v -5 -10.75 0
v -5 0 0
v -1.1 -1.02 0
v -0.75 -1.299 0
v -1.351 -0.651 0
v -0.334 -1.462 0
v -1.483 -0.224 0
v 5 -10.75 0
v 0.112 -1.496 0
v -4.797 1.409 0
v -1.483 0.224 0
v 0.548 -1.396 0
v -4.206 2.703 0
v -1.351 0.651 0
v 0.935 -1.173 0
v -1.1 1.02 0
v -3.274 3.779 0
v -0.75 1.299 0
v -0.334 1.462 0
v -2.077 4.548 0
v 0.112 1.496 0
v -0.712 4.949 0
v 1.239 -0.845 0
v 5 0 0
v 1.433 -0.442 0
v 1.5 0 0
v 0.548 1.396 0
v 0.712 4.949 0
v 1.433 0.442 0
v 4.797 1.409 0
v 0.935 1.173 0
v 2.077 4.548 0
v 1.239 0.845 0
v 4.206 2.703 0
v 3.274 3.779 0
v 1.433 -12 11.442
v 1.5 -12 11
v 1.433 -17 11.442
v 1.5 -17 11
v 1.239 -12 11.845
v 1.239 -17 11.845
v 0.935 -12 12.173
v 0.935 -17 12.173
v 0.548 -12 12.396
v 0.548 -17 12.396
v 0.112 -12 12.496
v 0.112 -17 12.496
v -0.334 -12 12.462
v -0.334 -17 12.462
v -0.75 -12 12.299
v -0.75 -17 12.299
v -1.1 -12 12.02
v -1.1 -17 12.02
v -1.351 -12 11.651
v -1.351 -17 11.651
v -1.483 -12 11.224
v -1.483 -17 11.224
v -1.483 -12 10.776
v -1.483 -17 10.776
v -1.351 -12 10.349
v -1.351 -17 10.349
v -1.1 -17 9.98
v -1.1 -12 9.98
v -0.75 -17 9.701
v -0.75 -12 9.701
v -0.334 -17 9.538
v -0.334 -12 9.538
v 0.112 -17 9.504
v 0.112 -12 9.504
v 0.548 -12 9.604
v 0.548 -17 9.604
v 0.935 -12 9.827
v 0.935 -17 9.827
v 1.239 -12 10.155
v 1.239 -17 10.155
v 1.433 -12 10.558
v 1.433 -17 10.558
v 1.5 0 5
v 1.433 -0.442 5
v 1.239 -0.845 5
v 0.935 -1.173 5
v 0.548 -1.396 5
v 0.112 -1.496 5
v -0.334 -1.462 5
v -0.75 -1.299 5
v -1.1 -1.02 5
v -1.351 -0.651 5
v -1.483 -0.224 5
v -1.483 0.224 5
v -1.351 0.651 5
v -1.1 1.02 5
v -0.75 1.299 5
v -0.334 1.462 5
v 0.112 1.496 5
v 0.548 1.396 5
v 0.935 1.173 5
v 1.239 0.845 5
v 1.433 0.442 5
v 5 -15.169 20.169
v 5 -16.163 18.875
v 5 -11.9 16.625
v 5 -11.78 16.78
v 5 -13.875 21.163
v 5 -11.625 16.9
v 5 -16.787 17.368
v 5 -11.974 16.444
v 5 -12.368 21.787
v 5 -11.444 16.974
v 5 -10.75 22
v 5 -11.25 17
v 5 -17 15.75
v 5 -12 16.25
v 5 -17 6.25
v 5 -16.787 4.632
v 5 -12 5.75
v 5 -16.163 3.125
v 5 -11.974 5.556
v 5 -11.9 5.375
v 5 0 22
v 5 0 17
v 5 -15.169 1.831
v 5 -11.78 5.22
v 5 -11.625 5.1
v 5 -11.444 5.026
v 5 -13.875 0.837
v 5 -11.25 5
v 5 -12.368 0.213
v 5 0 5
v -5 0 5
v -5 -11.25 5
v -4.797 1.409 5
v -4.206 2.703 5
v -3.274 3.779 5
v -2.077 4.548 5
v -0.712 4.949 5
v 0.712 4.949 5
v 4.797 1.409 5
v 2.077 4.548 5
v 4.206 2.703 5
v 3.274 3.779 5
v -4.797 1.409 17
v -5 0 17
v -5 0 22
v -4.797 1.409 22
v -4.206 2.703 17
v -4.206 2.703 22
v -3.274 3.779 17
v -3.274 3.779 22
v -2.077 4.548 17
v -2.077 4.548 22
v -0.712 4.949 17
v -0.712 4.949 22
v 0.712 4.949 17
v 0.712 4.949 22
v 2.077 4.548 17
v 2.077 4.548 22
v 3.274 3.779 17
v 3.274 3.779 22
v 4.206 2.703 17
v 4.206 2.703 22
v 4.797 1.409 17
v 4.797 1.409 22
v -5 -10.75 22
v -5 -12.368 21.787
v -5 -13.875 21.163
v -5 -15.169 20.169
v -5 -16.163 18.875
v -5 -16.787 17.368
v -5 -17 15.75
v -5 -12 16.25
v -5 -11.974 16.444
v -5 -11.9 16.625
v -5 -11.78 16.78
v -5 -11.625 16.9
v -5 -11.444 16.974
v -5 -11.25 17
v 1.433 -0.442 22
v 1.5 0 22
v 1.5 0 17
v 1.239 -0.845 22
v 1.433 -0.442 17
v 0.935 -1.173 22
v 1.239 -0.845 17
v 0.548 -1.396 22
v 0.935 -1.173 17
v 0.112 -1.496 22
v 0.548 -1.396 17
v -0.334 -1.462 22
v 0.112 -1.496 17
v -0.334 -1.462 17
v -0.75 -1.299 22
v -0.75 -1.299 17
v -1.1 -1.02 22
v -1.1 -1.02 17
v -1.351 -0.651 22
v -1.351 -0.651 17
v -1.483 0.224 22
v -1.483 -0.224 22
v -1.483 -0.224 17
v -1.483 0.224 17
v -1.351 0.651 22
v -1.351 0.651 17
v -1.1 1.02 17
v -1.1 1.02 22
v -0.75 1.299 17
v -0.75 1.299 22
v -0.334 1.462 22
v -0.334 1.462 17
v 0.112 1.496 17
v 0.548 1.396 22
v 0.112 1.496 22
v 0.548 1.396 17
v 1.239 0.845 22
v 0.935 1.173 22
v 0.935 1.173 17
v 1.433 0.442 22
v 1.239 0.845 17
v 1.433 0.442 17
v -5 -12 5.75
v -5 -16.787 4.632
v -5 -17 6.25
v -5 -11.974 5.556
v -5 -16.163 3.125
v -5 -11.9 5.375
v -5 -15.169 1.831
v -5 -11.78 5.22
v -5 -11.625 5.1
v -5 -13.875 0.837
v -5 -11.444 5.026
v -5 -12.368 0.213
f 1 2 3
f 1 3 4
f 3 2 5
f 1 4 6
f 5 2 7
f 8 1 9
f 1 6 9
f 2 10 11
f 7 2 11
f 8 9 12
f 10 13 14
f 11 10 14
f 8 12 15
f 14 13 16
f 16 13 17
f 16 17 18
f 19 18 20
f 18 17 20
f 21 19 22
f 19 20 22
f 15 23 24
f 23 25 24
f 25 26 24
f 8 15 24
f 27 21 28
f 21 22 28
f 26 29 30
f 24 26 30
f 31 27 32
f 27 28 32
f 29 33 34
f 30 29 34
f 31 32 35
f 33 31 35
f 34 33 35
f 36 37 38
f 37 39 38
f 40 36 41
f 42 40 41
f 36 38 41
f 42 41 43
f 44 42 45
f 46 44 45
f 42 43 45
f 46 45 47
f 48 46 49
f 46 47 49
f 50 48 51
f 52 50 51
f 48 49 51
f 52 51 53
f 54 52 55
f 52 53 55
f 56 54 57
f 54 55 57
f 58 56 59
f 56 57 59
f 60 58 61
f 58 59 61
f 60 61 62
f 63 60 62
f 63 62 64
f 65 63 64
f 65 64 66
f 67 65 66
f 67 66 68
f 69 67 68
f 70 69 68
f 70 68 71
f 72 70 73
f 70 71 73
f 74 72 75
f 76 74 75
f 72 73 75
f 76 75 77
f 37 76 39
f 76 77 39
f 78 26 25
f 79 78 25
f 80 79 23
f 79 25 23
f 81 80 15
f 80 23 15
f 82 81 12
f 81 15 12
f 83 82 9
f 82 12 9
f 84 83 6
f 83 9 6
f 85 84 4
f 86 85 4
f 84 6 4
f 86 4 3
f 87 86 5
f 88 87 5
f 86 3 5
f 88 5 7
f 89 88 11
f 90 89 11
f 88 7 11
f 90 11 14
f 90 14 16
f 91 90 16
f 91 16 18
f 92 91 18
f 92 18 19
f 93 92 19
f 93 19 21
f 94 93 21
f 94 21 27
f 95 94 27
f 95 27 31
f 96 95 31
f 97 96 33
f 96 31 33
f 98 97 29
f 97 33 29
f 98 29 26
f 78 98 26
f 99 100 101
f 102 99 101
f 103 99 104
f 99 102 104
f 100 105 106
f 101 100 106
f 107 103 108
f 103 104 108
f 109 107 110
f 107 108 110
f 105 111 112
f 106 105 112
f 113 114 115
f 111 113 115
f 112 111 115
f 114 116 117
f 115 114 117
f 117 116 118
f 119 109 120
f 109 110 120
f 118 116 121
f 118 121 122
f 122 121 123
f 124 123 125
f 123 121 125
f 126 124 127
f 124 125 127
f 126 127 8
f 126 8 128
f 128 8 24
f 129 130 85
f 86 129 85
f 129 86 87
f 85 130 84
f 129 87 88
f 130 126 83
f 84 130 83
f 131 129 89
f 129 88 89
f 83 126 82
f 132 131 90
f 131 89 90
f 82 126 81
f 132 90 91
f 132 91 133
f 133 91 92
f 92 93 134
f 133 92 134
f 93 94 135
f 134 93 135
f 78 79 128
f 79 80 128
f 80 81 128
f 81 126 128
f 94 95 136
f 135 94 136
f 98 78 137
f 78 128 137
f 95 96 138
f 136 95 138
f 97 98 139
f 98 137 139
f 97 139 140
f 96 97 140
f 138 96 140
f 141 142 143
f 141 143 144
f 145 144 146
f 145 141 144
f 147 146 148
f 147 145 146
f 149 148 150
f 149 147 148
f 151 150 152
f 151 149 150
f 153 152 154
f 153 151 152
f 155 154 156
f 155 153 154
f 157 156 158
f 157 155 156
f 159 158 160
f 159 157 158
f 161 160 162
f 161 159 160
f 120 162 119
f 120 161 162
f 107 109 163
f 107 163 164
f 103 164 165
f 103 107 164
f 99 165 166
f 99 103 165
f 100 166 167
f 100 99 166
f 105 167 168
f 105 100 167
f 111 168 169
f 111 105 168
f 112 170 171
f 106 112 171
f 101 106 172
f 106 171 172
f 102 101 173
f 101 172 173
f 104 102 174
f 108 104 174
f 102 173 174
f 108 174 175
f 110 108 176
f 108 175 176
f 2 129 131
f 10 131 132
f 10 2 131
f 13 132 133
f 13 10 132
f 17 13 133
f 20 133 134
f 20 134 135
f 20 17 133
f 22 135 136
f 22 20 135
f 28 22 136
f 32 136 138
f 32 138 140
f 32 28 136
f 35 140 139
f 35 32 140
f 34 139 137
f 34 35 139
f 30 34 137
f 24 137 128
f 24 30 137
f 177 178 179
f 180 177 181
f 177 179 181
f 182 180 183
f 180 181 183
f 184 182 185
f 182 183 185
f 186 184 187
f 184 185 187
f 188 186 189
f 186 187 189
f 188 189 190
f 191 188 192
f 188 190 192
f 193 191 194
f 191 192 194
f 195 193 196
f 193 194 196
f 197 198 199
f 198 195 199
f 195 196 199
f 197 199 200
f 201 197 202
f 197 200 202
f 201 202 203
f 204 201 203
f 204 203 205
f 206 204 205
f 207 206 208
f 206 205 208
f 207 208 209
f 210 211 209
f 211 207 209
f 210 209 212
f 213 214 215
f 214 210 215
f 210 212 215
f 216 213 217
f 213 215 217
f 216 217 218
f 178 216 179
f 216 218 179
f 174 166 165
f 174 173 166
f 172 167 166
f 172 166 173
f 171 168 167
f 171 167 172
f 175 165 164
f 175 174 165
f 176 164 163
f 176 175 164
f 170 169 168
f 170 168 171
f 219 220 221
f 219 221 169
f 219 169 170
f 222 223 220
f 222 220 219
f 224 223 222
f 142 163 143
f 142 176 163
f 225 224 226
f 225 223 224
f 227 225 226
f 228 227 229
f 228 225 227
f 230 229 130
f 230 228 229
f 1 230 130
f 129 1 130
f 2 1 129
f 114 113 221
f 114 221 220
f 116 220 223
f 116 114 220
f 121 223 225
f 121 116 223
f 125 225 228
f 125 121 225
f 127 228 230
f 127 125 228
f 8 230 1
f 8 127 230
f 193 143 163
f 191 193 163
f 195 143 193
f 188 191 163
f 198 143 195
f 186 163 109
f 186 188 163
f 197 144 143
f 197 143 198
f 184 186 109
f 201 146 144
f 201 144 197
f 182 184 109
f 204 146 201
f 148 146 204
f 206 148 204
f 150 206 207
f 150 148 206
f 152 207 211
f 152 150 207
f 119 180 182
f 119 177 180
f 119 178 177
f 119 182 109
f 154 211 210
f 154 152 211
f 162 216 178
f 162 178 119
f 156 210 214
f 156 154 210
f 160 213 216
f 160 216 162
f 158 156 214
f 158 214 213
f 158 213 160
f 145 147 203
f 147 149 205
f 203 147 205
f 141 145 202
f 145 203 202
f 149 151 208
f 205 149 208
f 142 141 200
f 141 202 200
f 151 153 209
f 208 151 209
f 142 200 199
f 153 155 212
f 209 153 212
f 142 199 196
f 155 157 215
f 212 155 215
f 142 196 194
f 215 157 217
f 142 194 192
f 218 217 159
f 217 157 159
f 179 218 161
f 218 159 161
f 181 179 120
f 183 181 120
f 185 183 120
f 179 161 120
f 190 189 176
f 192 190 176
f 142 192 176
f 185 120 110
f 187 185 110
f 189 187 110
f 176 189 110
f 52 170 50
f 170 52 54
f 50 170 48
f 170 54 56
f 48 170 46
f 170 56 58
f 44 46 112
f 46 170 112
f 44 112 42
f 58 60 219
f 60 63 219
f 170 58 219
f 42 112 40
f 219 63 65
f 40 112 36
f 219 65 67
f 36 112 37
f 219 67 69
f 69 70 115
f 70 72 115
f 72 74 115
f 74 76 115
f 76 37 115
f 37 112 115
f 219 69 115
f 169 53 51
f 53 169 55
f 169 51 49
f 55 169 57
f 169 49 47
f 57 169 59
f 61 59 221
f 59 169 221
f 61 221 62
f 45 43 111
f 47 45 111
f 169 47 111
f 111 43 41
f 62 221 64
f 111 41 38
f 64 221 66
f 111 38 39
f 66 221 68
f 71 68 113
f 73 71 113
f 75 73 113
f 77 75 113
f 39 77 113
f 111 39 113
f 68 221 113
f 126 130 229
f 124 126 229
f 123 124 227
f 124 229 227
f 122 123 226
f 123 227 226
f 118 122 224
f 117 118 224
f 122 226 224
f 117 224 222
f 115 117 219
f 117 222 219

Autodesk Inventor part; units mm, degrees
ref_plane "YZ Plane" through (0, 0, 0) normal (1, 0, 0) x (0, 1, 0)
ref_plane "XZ Plane" through (0, 0, 0) normal (0, 1, 0) x (-1, 0, 0)
ref_plane "XY Plane" through (0, 0, 0) normal (0, 0, 1) x (1, 0, 0)
sketch "Sketch1" plane through (0, 0, 0) normal (0, 0, 1) x (1, 0, 0)
  arc A0 (5, 0) -> (-5, 0) centre (0, 0) ccw
  line L0 (-5, -17) -> (5, -17)
  line L1 (5, -17) -> (5, 0)
  line L2 (-5, -17) -> (-5, 0)
  circle A1 centre (0, 0) radius 1.5
  dimension "d0" = 3
  dimension "d1" = 5
  dimension "d2" = 17
extrude "Extrusion1" add sketch "Sketch1" along normal blind 22
sketch "Sketch2" plane through (5, -17, 0) normal (1, 0, 0) x (0, 0, -1)
  line L0 (0, 17) -> (0, 17) projected
  line L1 (0, 17) -> (-22, 17) projected
  line L2 (-22, 17) -> (-22, 17) projected
  line L3 (0, 17) -> (-22, 17) projected
  line L4 (0, 0) -> (0, 17) projected
  line L5 (0, 17) -> (-22, 17) projected
  line L6 (-22, 0) -> (-22, 17) projected
  line L7 (0, 0) -> (-22, 0) projected
  line L8 (-17, 5) -> (-5, 5)
  line L9 (-5, 5) -> (-5, 25)
  line L10 (-5, 25) -> (-17, 25)
  line L11 (-17, 25) -> (-17, 5)
  dimension "d5" = 5
  dimension "d6" = 5
  dimension "d7" = 5
  dimension "d8" = 20
extrude "Extrusion2" cut sketch "Sketch2" against normal blind 22 contours L9 L8 L11 L1 | L1 L11 L10 L9
sketch "Sketch3" plane through (-5, -17, 0) normal (0, -1, 0) x (1, 0, 0)
  line L0 (0, 0) -> (10, 0) projected
  line L1 (10, 0) -> (10, 22) projected
  line L2 (0, 22) -> (10, 22) projected
  line L3 (0, 0) -> (0, 22) projected
  circle A0 centre (5, 11) radius 1.5
  point P0 (5, 0)
  dimension "d11" = 22
  dimension "d12" = 10
  dimension "d13" = 3
  dimension "d14" = 5
  dimension "d15" = 11
extrude "Extrusion3" cut sketch "Sketch3" against normal blind 6 contours A0
fillet "Fillet1" radius 6.25 2 edges at (0, -17, 22) (0, -17, 0)
fillet "Fillet2" radius 0.75 2 edges at (0, -12, 17) (0, -12, 5)
equation "\"d14\" = 0.5 * d12"
equation "\"d15\" = 0.5 * d11"
properties part number "PulleyHolder"
